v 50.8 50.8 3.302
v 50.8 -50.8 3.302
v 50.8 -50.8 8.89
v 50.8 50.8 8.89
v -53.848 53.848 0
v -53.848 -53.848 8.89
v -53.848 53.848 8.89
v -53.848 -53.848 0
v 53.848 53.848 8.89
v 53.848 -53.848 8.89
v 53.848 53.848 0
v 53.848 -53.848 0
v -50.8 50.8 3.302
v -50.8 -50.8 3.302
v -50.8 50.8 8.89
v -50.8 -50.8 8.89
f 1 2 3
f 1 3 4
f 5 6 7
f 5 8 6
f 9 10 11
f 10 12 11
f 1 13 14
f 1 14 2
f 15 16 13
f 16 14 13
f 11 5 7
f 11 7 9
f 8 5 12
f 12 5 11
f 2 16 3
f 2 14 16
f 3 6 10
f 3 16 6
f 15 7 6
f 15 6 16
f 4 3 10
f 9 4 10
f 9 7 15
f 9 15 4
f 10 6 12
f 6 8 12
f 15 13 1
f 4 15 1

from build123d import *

# Parameters (mm, degrees)
F1_W     = 107.696
F1_H     = 107.696
F1_W_2   = 101.6
F1_H_2   = 101.6
F2_DEPTH = 3.81
F0_W     = 101.6
F0_H     = 101.6
F3_DEPTH = 3.302
F4_DEPTH = 5.08


with BuildPart() as f2:
    # F1 (on face) → F2 (new body)
    with BuildSketch(Plane.XY):
        Rectangle(F1_W, F1_H)
        Rectangle(F1_W_2, F1_H_2, mode=Mode.SUBTRACT)
    extrude(amount=F2_DEPTH)

    # F0 (on Top) → F3 (join)
    with BuildSketch(Plane.XY):
        Rectangle(F0_W, F0_H)
    extrude(amount=F3_DEPTH)

    # F4 (add): a face of the model
    f4_faces = [f2.faces().sort_by_distance(p)[0] for p in [
        (-52.3249485619, 0, 3.81),
    ]]
    extrude(f4_faces, amount=F4_DEPTH)


solid = f2.part
